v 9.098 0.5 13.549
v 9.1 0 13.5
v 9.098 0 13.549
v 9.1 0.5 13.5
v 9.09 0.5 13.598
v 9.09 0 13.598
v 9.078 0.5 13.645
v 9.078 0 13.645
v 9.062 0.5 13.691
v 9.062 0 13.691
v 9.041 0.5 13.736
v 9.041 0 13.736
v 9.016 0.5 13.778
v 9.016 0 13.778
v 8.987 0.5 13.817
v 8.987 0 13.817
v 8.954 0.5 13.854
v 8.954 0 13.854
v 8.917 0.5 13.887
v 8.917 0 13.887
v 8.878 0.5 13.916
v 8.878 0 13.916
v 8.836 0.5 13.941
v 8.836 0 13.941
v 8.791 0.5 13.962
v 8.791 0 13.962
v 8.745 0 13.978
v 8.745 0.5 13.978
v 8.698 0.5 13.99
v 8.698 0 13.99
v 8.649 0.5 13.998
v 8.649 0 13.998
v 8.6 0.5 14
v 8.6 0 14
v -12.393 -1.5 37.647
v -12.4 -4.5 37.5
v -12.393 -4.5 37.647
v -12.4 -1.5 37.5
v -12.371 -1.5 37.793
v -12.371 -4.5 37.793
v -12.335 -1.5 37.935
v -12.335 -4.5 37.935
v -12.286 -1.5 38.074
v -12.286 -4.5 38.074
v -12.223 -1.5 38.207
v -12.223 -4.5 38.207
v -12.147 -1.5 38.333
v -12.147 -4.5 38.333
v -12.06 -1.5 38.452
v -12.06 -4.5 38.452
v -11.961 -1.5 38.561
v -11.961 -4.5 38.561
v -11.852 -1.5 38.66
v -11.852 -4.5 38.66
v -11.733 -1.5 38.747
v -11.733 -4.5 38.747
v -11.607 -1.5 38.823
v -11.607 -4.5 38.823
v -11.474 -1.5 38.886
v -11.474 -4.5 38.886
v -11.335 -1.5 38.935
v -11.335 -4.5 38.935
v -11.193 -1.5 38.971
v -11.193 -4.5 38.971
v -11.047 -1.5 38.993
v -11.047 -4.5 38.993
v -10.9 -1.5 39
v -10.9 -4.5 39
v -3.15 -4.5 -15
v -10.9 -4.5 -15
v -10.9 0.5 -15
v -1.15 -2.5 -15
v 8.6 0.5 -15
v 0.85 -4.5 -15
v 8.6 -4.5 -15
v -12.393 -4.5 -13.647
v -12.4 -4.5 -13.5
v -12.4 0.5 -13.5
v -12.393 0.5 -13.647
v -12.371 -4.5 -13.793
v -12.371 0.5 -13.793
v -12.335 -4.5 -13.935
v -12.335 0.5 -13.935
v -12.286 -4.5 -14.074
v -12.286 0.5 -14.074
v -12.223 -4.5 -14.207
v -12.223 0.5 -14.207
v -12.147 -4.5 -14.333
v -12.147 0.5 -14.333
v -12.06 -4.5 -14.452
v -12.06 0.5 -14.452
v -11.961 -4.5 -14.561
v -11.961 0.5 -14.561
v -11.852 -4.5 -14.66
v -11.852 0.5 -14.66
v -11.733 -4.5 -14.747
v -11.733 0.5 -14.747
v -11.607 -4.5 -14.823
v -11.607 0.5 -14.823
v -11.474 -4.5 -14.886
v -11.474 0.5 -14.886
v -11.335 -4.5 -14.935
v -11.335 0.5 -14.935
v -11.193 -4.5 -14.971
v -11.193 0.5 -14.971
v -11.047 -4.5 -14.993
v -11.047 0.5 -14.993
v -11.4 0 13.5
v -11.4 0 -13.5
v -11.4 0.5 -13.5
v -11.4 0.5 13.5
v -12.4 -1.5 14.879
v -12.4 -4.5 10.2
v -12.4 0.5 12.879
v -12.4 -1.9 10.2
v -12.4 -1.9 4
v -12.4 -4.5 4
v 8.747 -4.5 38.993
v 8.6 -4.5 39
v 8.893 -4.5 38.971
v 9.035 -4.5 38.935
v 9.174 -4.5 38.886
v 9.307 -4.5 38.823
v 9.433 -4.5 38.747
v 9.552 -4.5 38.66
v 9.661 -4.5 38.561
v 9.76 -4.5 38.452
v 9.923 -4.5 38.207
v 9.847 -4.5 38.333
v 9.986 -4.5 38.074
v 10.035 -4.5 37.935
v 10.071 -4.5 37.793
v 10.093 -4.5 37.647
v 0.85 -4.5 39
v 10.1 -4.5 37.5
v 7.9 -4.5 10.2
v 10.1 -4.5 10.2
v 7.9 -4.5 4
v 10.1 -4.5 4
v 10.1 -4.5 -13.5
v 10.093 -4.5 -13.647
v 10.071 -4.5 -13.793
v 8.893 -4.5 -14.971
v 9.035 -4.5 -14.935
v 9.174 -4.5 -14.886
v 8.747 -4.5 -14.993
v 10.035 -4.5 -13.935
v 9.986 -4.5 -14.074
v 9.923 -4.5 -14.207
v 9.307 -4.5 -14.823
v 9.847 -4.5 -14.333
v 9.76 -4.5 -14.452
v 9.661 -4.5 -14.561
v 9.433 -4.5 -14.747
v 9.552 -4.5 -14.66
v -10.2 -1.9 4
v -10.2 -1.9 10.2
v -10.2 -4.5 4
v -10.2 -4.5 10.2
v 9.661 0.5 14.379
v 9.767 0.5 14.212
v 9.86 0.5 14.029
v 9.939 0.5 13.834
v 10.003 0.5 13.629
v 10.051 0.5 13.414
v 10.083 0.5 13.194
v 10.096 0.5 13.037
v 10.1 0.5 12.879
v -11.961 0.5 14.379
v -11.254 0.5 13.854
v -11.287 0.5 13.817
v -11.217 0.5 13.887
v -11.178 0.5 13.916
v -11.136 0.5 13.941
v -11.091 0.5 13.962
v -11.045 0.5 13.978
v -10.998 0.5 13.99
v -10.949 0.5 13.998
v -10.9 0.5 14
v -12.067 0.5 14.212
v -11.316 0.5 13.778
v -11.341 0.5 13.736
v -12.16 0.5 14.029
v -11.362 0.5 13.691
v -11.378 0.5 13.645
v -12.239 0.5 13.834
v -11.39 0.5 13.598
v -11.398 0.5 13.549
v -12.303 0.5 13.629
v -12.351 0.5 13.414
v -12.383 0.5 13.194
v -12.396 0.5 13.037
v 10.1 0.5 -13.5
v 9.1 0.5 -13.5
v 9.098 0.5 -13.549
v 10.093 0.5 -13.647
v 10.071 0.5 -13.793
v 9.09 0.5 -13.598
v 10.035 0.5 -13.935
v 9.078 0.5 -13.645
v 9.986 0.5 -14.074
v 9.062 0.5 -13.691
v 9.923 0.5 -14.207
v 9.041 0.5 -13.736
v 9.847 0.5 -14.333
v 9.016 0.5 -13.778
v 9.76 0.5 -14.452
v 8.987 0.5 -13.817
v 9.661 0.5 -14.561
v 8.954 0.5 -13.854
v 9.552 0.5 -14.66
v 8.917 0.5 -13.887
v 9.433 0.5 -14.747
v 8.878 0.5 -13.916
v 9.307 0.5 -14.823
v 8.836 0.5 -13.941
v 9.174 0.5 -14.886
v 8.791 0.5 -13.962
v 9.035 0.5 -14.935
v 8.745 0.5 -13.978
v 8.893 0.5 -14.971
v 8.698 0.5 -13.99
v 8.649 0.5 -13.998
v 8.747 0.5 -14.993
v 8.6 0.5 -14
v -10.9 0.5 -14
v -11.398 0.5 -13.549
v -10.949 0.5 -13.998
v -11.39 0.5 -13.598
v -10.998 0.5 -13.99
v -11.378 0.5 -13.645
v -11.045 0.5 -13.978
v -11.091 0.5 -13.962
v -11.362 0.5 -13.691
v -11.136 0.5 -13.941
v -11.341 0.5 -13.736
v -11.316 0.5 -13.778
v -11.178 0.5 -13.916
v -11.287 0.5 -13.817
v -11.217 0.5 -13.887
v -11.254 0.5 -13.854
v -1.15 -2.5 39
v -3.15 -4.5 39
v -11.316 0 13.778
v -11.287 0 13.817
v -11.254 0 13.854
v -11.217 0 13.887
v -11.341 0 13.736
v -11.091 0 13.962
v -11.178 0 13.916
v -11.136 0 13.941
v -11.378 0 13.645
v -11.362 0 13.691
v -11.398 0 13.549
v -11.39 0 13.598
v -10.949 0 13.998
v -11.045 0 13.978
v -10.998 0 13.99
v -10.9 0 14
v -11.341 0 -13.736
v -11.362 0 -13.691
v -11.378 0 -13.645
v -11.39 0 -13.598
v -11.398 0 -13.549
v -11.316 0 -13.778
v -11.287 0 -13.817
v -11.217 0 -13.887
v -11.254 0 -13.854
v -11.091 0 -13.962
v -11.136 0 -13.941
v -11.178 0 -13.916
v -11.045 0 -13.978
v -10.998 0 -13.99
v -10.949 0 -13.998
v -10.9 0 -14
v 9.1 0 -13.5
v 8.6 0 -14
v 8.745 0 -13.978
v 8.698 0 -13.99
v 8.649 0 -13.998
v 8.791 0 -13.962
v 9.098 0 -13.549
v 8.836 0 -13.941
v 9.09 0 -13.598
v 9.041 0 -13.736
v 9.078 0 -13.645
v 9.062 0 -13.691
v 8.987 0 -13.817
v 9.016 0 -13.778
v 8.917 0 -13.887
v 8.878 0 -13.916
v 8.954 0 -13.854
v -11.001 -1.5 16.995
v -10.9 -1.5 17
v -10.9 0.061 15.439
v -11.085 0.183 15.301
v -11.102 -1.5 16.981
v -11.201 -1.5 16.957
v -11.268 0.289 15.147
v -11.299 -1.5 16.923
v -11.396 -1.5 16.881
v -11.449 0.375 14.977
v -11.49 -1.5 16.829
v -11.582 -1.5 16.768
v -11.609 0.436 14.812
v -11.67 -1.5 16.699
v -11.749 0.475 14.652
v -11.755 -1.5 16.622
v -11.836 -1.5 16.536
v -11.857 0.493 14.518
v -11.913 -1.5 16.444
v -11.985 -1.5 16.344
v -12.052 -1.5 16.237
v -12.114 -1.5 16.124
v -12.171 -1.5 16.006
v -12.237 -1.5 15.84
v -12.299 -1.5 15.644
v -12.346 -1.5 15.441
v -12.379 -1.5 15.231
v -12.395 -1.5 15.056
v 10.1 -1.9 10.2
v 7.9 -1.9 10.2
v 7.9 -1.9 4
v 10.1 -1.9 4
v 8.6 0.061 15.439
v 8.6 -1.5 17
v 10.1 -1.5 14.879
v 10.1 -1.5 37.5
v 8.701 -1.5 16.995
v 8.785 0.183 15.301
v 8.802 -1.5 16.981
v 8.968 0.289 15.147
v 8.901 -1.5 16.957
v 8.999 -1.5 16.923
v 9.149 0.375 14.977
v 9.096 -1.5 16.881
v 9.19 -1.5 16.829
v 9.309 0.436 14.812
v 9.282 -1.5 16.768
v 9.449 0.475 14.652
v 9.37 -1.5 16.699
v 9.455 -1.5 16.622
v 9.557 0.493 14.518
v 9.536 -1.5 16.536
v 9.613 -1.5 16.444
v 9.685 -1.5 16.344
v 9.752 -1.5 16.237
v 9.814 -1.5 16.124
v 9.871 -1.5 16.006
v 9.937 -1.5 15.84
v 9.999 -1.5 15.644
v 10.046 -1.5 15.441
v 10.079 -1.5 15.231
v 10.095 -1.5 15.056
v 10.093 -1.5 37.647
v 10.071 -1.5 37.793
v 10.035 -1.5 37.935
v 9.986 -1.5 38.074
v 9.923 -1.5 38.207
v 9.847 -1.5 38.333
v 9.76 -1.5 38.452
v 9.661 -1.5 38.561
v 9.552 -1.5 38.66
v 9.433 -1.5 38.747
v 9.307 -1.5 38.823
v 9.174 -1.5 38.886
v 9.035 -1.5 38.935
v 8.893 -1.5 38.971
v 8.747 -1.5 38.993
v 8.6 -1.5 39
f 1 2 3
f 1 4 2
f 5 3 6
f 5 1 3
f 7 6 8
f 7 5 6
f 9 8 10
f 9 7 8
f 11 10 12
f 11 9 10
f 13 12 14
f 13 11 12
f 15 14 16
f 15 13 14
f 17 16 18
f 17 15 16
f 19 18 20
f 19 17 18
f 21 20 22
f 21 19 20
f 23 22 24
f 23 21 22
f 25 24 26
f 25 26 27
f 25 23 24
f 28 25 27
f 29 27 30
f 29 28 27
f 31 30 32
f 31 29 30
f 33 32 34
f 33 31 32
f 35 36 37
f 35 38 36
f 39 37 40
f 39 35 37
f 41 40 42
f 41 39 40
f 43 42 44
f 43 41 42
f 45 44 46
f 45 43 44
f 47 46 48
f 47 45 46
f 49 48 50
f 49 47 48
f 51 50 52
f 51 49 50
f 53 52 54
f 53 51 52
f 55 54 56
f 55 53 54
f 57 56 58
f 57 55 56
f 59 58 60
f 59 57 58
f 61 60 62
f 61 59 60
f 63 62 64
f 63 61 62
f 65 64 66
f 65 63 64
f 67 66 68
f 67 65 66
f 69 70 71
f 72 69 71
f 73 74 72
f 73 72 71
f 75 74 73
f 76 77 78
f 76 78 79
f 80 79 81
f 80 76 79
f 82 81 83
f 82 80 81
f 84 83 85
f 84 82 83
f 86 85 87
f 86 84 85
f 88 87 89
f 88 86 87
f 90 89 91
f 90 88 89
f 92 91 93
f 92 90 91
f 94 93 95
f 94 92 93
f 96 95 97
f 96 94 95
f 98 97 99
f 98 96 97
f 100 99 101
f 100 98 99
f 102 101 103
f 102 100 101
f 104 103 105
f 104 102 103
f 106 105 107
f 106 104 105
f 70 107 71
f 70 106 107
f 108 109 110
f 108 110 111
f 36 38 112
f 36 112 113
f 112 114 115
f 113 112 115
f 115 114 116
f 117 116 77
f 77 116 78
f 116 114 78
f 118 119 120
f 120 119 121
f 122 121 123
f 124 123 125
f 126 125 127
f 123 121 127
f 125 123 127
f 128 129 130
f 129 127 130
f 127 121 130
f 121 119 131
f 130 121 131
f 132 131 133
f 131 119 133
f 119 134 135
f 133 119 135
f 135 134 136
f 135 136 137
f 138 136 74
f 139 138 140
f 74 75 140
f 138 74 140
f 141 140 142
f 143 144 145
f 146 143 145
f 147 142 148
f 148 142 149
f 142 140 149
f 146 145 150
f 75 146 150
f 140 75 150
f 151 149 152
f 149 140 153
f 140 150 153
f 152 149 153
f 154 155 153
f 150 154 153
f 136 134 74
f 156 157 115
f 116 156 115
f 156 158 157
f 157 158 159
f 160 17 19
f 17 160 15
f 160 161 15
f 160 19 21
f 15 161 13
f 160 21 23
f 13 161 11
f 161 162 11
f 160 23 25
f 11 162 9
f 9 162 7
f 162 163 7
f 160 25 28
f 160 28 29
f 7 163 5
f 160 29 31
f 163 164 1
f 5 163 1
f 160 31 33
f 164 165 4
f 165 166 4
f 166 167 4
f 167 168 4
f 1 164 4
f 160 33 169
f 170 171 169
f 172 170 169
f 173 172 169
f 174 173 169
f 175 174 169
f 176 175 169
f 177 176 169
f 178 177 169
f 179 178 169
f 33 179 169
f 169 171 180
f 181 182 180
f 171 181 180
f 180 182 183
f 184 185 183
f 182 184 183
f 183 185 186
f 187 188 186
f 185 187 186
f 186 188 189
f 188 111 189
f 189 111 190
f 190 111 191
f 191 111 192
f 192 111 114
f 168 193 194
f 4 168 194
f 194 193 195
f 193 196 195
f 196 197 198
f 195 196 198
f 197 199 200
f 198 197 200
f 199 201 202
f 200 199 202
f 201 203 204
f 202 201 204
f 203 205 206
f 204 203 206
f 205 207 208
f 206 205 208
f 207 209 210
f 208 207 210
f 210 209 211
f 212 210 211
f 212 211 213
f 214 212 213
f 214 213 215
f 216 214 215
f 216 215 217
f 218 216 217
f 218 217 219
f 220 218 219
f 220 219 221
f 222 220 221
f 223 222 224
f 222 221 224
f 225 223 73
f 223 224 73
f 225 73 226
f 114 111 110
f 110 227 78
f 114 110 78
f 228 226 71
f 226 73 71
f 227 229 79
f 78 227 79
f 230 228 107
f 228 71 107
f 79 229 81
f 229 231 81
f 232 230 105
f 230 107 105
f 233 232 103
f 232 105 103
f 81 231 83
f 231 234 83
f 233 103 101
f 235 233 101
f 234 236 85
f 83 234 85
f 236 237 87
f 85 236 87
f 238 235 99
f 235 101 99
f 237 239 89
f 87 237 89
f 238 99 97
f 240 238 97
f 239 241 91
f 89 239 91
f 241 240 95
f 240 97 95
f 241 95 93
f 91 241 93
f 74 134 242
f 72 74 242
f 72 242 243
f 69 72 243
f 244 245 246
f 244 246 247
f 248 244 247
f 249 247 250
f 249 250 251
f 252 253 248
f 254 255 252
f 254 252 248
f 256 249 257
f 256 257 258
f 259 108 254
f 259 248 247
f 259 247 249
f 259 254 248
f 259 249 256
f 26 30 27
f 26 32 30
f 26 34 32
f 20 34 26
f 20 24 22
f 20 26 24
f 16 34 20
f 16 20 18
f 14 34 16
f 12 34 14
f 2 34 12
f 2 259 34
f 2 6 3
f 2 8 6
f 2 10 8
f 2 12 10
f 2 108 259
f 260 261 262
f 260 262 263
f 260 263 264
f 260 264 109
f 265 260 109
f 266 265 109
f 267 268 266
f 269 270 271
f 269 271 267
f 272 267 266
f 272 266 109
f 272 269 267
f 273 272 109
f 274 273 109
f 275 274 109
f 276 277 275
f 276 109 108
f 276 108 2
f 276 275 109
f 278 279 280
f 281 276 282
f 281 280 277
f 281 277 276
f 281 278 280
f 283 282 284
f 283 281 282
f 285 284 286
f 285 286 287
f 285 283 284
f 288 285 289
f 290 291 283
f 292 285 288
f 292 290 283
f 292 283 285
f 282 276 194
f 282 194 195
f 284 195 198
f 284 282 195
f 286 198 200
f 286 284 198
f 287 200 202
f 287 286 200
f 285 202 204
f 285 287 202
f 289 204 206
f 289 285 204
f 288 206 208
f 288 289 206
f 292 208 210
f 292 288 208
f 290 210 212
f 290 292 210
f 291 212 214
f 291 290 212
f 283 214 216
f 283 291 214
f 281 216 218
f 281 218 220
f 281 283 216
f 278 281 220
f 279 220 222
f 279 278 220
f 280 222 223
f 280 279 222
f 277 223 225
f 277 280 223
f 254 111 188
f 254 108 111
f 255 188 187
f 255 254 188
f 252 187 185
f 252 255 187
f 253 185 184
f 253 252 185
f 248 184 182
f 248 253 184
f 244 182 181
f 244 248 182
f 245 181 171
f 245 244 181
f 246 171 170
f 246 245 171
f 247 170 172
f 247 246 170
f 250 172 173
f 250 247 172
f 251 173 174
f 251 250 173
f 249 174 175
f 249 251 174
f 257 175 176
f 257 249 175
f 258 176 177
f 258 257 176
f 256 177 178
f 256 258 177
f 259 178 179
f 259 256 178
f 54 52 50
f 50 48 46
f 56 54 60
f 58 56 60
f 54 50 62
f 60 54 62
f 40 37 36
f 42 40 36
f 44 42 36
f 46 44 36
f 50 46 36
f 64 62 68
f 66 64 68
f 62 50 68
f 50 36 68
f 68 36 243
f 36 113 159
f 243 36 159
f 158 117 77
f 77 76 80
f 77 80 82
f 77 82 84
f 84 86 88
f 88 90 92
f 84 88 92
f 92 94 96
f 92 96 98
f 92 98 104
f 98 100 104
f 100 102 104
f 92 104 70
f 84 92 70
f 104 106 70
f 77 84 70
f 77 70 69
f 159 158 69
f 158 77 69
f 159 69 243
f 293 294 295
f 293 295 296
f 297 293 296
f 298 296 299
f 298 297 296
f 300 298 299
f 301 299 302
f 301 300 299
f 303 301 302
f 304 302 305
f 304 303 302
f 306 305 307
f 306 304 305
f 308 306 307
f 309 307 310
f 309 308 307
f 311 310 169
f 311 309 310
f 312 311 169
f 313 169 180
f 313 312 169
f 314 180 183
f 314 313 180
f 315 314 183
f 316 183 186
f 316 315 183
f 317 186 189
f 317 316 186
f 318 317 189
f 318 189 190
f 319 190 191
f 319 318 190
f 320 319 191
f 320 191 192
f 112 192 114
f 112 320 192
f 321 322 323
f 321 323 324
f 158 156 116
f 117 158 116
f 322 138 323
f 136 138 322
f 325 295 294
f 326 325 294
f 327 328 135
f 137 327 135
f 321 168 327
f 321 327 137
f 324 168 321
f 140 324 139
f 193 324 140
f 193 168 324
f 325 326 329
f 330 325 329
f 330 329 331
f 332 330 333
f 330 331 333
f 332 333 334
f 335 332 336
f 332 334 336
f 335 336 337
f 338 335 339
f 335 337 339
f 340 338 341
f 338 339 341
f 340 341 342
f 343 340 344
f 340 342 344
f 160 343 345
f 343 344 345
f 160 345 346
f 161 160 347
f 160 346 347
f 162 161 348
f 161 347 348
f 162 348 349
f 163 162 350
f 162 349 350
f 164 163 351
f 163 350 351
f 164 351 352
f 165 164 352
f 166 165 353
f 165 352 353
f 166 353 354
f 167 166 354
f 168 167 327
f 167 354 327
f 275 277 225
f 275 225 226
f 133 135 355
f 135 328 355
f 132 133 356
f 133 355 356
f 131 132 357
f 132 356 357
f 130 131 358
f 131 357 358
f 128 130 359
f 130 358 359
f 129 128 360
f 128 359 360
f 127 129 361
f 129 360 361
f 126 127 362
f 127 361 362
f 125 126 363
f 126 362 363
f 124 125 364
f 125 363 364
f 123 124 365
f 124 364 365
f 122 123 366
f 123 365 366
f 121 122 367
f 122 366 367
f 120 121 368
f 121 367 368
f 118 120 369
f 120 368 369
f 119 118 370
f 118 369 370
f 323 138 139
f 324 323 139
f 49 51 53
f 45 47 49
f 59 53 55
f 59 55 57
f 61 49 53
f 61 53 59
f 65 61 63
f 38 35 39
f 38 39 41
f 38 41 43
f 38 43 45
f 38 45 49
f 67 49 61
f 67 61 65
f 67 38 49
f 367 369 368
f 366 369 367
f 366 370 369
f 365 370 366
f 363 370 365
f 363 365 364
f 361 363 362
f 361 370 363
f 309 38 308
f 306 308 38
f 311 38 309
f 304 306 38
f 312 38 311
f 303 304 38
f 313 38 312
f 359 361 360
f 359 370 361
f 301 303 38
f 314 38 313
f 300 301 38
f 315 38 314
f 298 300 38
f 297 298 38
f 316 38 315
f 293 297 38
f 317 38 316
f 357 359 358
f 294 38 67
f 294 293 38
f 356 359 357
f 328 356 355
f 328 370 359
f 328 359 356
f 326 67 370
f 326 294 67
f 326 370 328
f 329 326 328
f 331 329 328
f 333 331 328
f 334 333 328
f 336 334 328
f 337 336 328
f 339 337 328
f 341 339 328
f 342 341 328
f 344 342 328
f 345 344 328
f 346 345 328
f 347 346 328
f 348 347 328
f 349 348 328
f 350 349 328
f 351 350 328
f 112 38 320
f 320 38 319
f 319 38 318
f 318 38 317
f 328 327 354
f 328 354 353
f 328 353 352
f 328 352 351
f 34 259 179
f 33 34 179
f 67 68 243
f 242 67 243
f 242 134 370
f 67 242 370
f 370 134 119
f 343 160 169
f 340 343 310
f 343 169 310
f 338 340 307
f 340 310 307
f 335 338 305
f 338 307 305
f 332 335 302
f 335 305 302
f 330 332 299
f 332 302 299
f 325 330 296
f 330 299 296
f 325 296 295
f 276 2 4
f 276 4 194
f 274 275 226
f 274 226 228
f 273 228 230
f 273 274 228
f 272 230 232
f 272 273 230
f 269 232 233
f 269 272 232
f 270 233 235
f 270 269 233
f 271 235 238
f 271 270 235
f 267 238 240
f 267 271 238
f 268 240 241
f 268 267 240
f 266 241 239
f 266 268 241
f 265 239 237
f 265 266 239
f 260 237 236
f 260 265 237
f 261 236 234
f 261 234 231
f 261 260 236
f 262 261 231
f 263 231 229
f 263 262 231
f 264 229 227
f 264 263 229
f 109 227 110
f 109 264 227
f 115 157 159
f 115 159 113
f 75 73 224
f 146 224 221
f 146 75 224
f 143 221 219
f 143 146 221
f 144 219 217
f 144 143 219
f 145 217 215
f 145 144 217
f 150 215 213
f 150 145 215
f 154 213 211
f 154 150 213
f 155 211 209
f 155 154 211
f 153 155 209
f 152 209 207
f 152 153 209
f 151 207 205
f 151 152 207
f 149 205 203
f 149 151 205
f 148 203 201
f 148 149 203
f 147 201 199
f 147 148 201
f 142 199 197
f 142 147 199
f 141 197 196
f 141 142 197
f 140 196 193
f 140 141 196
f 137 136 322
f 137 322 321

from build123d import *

# Parameters (mm, degrees)
SURFACE_SKETCH_W         = 22.5
SURFACE_SKETCH_H         = 30
BODY_DEPTH               = 4.5
SKETCH_19_W              = 22.5
SKETCH_19_H              = 24
EXTRUDE_4_DEPTH          = 3
FILLET_6_R               = 1.5
MAGNET_CUTOUT_SKETCH_W   = 2.2
MAGNET_CUTOUT_SKETCH_H   = 6.2
MAGNET_CUTOUT_DEPTH      = 2.6
BORDER_DEPTH             = 0.5
CHAMPFER_DEPTH           = 22.5
FILLET_7_R               = 1.5
FILLET_8_R               = 0.5
CUT_EXTRUDE_1_DEPTH      = 23.5
CUT_EXTRUDE_2_DEPTH      = 1
CUT_EXTRUDE_2_DEPTH_BACK = 55


with BuildPart() as part:
    # surface_sketch → body (new body)
    with BuildSketch(Plane(origin=(0, 0, 0), x_dir=(1, 0, 0), z_dir=(0, 1, 0))):
        with Locations((-1.15, 0)):
            Rectangle(SURFACE_SKETCH_W, SURFACE_SKETCH_H)
    extrude(amount=-BODY_DEPTH)

    # Эскиз19 → Бобышка-Вытянуть4 (add)
    with BuildSketch(Plane(origin=(0, -4.5, 0), x_dir=(1, 0, 0), z_dir=(0, 1, 0))):
        with Locations((-1.15, -27)):
            Rectangle(SKETCH_19_W, SKETCH_19_H)
    extrude(amount=EXTRUDE_4_DEPTH)

    # Скругление6
    fillet_6_edges = [part.edges().sort_by_distance(p)[0] for p in [
        (-12.4, -3, 39),
        (10.1, -3, 39),
        (10.1, -2.25, -15),
        (-12.4, -2.25, -15),
    ]]
    fillet(fillet_6_edges, radius=FILLET_6_R)

    # magnet_cutout_sketch → magnet_cutout (cut)
    with BuildSketch(Plane.XZ.offset(4.5)):
        with Locations((9, 7.1)):
            Rectangle(MAGNET_CUTOUT_SKETCH_W, MAGNET_CUTOUT_SKETCH_H)
    magnet_cutout = extrude(amount=-MAGNET_CUTOUT_DEPTH, mode=Mode.SUBTRACT)

    # magnet_cutout_mirror: magnet_cutout across plane
    add(magnet_cutout.mirror(Plane(origin=(-1.15, 0, 0), x_dir=(0, 0, 1), z_dir=(1, 0, 0))), mode=Mode.SUBTRACT)

    # border_sketch → border (add)
    with BuildSketch(Plane(origin=(0, 0, 0), x_dir=(1, 0, 0), z_dir=(0, 1, 0))):
        with BuildLine():
            Line((-12.4, -15), (-12.4, 13.5))
            ThreePointArc((-12.4, 13.5), (-11.960660172, 14.560660172), (-10.9, 15))
            Line((-10.9, 15), (8.6, 15))
            ThreePointArc((8.6, 15), (9.660660172, 14.560660172), (10.1, 13.5))
            Line((10.1, 13.5), (10.1, -15))
            Line((10.1, -15), (9.1, -15))
            Line((9.1, -15), (9.1, 13.5))
            ThreePointArc((9.1, 13.5), (8.953553391, 13.853553391), (8.6, 14))
            Line((8.6, 14), (-10.9, 14))
            ThreePointArc((-10.9, 14), (-11.253553391, 13.853553391), (-11.4, 13.5))
            Line((-11.4, 13.5), (-11.4, -15))
            Line((-11.4, -15), (-12.4, -15))
        make_face()
    extrude(amount=BORDER_DEPTH)

    # Эскиз21 → champfer (add)
    with BuildSketch(Plane.ZY.offset(12.4)):
        Polygon((15, 0.5), (17, -1.5), (15, -1.5), (14, -1.5), (14, 0.5), align=None)
    extrude(amount=-CHAMPFER_DEPTH)

    # Скругление7
    fillet_7_edges = [part.edges().sort_by_distance(p)[0] for p in [
        (-12.4, -0.5, 16),
        (10.1, -0.5, 16),
    ]]
    fillet(fillet_7_edges, radius=FILLET_7_R)

    # Скругление8
    fillet_8_edges = [part.edges().sort_by_distance(p)[0] for p in [
        (9.1, 0.25, 14),
        (-11.4, 0.25, 14),
    ]]
    fillet(fillet_8_edges, radius=FILLET_8_R)

    # Эскиз22 → Вырез-Вытянуть1 (cut, through all)
    with BuildSketch(Plane.ZY.offset(12.4)):
        with BuildLine():
            Line((12.878679656, 0.5), (14.378679656, 0.5))
            ThreePointArc((14.378679656, 0.5), (14.952704805, 0.385819299), (15.439339828, 0.060660172))
            Line((15.439339828, 0.060660172), (17, -1.5))
            Line((17, -1.5), (17.923275361, -1.5))
            Line((17.923275361, -1.5), (15.181180077, 1.242095285))
            Line((15.181180077, 1.242095285), (12.878679656, 1.122407091))
            Line((12.878679656, 1.122407091), (12.878679656, 0.5))
        make_face()
    extrude(amount=-CUT_EXTRUDE_1_DEPTH, mode=Mode.SUBTRACT)

    # Эскиз23 → Вырез-Вытянуть2 (cut, two sides)
    with BuildSketch(Plane(origin=(0, 0, -15), x_dir=(-1, 0, 0), z_dir=(0, 0, -1))) as cut_extrude_2_sk:
        Polygon((1.15, -4.5), (-0.85, -4.5), (1.15, -2.5), (3.15, -4.5), align=None)
    extrude(amount=CUT_EXTRUDE_2_DEPTH, mode=Mode.SUBTRACT)
    extrude(cut_extrude_2_sk.sketch, amount=-CUT_EXTRUDE_2_DEPTH_BACK, mode=Mode.SUBTRACT)


solid = part.part
